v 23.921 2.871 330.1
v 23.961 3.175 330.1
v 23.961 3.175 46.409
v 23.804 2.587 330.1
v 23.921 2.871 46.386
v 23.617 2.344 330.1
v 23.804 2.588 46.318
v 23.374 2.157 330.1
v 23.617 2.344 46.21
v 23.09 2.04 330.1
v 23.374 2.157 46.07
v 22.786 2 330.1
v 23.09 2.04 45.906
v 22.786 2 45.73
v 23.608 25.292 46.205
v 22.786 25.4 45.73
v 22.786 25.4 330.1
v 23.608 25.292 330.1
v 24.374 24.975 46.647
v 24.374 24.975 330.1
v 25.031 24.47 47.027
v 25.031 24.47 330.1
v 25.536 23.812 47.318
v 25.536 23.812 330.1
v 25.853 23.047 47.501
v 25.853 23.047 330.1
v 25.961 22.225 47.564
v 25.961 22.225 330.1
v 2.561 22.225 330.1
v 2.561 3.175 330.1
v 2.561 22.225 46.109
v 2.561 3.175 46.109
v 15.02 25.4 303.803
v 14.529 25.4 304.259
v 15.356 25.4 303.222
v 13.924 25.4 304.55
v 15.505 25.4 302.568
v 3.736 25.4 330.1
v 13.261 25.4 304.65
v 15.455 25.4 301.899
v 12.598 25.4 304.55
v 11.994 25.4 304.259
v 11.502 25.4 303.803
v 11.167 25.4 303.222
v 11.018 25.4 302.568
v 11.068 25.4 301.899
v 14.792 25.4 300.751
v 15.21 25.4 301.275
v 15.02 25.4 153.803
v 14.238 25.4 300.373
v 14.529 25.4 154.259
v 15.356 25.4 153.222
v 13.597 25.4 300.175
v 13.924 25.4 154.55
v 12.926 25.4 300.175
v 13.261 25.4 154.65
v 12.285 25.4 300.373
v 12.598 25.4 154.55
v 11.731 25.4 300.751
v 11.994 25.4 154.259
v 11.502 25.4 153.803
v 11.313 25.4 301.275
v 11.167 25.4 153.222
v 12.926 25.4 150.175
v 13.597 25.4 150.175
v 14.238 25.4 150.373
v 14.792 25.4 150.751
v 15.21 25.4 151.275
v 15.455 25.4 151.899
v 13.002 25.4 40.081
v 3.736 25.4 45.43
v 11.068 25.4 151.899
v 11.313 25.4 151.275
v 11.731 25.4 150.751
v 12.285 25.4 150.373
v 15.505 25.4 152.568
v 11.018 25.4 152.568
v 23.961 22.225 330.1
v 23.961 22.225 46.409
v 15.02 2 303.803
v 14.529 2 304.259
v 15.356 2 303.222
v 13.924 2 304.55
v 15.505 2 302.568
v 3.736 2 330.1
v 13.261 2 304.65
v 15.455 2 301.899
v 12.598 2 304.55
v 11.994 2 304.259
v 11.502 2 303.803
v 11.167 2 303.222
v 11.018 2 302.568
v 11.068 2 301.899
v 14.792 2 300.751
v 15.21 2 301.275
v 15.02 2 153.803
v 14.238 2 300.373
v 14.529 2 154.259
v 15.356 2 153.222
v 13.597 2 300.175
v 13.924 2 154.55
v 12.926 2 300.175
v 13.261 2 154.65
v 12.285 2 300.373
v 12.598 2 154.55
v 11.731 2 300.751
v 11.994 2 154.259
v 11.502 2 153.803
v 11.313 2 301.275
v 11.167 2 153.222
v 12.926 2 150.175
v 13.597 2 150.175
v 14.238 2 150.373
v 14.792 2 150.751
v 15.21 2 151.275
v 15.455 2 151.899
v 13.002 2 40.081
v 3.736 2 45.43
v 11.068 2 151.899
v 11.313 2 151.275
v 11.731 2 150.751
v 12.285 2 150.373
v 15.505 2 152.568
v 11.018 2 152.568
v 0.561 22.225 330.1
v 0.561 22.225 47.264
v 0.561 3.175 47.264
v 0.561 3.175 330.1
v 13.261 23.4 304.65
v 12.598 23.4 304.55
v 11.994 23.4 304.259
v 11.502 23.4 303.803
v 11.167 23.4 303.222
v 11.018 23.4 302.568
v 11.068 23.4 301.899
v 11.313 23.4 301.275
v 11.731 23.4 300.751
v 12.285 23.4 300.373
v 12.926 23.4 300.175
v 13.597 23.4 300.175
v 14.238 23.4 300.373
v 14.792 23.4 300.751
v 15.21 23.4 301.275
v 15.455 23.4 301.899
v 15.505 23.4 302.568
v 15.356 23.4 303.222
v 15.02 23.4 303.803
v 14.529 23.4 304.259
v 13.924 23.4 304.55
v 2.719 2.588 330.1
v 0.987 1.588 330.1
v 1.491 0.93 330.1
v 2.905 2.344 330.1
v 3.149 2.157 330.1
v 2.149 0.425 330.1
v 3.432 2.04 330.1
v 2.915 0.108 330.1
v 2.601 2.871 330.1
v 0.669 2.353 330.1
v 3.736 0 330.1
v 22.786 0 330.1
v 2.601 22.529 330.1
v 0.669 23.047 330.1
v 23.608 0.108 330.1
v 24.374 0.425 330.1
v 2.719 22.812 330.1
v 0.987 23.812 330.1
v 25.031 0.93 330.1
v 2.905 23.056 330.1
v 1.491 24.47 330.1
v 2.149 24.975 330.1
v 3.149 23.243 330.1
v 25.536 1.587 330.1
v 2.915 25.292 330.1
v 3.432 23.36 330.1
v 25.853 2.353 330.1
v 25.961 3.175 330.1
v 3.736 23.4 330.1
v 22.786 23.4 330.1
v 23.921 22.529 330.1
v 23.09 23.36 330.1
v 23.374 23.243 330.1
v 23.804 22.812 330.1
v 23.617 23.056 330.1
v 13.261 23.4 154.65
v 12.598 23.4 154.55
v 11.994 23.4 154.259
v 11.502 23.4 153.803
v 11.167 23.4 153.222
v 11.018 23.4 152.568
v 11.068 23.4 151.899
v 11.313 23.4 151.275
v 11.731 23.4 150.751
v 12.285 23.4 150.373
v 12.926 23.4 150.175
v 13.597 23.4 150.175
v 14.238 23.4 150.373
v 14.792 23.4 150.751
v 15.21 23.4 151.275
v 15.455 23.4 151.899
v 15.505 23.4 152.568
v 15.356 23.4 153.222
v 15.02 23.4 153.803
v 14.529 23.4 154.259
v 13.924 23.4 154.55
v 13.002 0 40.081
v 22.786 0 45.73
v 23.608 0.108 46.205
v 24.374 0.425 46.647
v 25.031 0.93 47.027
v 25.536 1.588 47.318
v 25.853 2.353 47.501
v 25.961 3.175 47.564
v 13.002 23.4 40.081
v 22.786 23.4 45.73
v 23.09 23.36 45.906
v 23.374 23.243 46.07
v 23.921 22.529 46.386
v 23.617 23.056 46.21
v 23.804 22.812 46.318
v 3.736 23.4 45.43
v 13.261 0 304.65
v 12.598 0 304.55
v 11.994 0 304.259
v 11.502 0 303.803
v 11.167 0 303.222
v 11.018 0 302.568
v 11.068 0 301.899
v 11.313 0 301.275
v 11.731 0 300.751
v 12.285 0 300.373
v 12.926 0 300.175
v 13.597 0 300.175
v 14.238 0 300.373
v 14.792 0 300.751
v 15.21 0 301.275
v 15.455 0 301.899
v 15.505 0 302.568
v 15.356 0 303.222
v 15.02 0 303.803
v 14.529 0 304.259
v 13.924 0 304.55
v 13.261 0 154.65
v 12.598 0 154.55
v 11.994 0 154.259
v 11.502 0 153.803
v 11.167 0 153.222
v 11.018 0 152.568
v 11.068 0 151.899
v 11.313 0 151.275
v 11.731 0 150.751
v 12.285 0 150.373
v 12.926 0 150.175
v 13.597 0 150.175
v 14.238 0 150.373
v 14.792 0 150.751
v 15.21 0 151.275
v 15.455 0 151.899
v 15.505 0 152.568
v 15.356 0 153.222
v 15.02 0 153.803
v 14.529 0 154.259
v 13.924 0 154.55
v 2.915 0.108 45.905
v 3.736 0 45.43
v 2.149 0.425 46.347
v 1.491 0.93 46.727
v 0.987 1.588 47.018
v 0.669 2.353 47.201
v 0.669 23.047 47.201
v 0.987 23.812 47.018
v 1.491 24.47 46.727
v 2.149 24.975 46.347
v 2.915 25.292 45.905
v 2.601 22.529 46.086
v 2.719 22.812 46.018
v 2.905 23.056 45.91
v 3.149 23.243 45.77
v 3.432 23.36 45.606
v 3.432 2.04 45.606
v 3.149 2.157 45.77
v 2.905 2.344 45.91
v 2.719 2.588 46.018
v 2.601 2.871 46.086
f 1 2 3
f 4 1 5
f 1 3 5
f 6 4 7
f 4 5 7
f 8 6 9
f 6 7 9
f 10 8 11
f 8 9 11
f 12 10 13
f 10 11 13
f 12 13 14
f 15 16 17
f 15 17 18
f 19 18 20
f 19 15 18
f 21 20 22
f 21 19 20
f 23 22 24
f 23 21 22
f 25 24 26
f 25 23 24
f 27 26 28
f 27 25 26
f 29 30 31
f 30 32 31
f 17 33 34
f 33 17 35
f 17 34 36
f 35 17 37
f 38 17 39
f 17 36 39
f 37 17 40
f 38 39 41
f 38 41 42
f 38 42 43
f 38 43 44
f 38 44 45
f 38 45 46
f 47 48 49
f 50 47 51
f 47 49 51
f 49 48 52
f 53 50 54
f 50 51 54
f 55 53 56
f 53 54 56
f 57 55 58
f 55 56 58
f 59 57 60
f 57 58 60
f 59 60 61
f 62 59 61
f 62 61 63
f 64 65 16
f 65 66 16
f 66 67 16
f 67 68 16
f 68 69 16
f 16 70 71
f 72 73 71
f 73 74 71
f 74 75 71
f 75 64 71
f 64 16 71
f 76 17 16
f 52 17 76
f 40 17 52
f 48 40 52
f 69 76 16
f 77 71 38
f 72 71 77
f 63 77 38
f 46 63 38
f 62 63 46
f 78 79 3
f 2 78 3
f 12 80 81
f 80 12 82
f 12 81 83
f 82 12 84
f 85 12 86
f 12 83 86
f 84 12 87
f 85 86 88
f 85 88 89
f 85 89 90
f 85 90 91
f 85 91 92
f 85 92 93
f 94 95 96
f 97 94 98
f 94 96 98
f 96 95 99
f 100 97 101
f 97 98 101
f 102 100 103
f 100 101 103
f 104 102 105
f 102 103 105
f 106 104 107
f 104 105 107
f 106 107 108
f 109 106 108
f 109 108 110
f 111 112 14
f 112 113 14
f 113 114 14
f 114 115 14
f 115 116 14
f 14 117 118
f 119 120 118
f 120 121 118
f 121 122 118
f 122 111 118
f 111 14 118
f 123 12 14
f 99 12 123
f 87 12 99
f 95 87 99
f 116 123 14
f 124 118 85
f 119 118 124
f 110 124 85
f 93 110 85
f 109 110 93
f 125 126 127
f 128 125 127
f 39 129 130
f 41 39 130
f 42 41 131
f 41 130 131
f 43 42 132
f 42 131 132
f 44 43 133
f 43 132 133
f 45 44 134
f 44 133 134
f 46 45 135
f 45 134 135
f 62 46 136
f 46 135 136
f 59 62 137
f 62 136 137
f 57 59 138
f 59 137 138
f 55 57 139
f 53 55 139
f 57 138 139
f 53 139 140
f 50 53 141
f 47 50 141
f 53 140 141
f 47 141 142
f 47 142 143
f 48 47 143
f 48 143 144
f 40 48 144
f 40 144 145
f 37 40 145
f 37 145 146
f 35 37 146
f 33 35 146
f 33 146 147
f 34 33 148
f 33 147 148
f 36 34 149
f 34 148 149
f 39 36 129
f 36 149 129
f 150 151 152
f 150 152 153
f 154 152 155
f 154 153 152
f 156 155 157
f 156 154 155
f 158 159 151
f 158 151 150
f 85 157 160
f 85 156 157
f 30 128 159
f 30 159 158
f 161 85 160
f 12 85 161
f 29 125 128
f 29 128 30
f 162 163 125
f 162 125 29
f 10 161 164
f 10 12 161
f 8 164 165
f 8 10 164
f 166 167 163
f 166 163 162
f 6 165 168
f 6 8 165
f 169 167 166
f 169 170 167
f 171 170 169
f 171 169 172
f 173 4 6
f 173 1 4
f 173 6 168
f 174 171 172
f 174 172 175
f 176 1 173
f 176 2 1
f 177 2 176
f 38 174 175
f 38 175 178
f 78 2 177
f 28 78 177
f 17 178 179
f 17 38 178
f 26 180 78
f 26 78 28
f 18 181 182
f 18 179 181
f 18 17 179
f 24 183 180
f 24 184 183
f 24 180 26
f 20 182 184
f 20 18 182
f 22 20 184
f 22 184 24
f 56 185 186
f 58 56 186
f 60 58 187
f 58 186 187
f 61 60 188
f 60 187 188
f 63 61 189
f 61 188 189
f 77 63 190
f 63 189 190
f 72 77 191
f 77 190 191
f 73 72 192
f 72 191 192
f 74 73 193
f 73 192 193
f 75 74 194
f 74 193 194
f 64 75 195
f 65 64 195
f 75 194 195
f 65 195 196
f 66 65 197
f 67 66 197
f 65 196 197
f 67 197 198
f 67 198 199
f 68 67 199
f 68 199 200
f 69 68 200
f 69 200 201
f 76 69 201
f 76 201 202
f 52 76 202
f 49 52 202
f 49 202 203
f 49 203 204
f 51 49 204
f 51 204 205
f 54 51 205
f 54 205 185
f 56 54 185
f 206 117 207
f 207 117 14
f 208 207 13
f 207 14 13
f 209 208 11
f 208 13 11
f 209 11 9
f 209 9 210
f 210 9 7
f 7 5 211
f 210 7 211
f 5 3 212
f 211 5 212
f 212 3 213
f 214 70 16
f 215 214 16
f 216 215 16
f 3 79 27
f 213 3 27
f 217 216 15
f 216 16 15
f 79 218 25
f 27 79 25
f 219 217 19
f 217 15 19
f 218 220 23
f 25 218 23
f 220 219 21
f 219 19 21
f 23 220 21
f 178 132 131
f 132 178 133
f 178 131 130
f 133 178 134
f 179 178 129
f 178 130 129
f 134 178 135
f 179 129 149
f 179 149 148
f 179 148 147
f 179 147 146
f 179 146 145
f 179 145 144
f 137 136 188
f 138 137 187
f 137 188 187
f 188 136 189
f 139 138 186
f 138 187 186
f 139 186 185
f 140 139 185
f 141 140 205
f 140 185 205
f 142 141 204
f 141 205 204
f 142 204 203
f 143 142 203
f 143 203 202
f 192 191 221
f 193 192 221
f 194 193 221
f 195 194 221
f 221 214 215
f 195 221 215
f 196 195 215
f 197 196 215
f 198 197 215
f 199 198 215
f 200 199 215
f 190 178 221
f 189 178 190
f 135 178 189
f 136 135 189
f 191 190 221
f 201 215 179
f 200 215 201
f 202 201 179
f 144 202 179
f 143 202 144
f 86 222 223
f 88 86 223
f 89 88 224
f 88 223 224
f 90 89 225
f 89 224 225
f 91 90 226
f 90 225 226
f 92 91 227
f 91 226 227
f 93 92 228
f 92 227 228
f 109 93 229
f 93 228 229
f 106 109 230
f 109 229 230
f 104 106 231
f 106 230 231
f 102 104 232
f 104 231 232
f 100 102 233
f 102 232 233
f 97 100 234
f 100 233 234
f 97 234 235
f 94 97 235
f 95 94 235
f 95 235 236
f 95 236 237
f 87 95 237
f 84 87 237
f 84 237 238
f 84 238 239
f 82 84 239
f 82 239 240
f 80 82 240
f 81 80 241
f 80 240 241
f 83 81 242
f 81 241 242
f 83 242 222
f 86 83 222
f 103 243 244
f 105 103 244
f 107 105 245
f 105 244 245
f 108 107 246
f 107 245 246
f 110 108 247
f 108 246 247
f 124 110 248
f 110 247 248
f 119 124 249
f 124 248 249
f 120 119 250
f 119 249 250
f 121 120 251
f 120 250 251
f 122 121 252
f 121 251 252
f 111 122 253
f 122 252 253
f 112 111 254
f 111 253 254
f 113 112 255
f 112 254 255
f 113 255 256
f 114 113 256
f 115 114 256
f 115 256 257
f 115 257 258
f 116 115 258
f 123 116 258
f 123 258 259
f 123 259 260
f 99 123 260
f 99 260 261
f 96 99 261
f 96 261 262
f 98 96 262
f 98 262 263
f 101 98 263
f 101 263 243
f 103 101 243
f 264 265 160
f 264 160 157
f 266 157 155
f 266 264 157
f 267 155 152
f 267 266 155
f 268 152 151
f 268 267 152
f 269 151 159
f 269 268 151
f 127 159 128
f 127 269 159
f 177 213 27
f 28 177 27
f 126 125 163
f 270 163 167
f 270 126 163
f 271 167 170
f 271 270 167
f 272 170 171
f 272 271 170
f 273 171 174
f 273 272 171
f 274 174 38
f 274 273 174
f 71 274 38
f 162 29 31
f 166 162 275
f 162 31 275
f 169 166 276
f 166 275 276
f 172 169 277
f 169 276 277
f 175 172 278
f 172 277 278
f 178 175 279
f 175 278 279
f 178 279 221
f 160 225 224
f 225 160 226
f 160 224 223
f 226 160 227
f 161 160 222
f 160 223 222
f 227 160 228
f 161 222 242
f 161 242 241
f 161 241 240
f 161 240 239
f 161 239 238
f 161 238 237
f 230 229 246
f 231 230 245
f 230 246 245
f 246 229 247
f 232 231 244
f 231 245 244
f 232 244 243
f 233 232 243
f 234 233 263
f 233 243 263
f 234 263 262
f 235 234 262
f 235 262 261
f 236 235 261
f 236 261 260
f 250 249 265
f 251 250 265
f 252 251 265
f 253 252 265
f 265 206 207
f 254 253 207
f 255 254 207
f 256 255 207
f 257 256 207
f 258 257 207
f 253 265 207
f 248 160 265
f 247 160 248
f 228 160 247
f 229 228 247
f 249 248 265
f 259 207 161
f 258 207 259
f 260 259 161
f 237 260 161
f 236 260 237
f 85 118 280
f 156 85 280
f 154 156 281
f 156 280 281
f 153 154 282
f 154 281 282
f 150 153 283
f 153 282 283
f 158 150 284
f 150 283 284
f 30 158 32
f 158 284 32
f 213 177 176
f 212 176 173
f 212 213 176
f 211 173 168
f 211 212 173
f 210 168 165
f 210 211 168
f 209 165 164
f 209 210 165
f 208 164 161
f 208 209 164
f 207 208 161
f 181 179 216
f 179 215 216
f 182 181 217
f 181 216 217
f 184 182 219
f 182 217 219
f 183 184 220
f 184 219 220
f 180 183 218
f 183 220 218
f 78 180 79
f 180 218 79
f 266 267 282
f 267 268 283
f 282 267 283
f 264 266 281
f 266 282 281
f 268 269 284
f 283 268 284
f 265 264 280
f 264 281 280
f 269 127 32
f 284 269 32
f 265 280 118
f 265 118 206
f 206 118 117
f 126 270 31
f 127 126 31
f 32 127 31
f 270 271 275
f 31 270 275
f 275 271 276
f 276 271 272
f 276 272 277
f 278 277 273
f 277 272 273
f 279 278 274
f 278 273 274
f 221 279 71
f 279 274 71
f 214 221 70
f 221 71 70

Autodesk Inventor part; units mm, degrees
ref_plane "YZ Plane" through (0, 0, 0) normal (1, 0, 0) x (0, 1, 0)
ref_plane "XZ Plane" through (0, 0, 0) normal (0, 1, 0) x (-1, 0, 0)
ref_plane "XY Plane" through (0, 0, 0) normal (0, 0, 1) x (1, 0, 0)
sketch "Sketch1" plane through (0, 0, 0) normal (0, 0, 1) x (1, 0, 0)
  line L0 (3.7363, 0) -> (22.7863, 0)
  line L1 (25.9613, 3.175) -> (25.9613, 22.225)
  line L2 (22.7863, 25.4) -> (3.7363, 25.4)
  line L3 (0.5613, 22.225) -> (0.5613, 3.175)
  arc A0 (3.7363, 25.4) -> (0.5613, 22.225) centre (3.7363, 22.225) ccw
  arc A1 (0.5613, 3.175) -> (3.7363, 0) centre (3.7363, 3.175) ccw
  arc A2 (22.7863, 0) -> (25.9613, 3.175) centre (22.7863, 3.175) ccw
  arc A3 (25.9613, 22.225) -> (22.7863, 25.4) centre (22.7863, 22.225) ccw
  line L4 (3.7363, 23.4) -> (22.7863, 23.4)
  arc A4 (23.9613, 22.225) -> (22.7863, 23.4) centre (22.7863, 22.225) ccw
  line L5 (23.9613, 22.225) -> (23.9613, 3.175)
  arc A5 (22.7863, 2) -> (23.9613, 3.175) centre (22.7863, 3.175) ccw
  line L6 (22.7863, 2) -> (3.7363, 2)
  arc A6 (2.5613, 3.175) -> (3.7363, 2) centre (3.7363, 3.175) ccw
  line L7 (2.5613, 3.175) -> (2.5613, 22.225)
  arc A7 (3.7363, 23.4) -> (2.5613, 22.225) centre (3.7363, 22.225) ccw
  point P0 (0, 0)
  point P1 (0.5613, 0)
  point P2 (25.9613, 0)
  point P3 (0.5613, 25.4)
  dimension "d0" = 25.4
  dimension "d2" = 25.4
  dimension "d3" = 3.175
  dimension "d4" = 2
extrude "tube" add sketch "Sketch1" along normal blind 330.1
sketch "Sketch7" plane through (3.7363, 25.4, 0) normal (0, 1, 0) x (1, 0, 0)
  line L0 (19.05, 0) -> (0, 0) projected
  circle A0 centre (9.525, -25.4) radius 3.5758
  point P0 (-3.7363, 0)
  dimension "d45" = 25.4
hole "centerHole_cutOff" at (13.2613, 25.4, 25.4) direction (0, -1, 0) diameter 6.35 end through all
sketch "Sketch8" plane through (3.7363, 25.4, 0) normal (0, 1, 0) x (1, 0, 0)
  circle A0 centre (9.525, -25.4) radius 3.175 projected
  line L0 (0, 0) -> (0, -330.1) projected
  circle A1 centre (9.525, -152.4) radius 1.4483
  circle A2 centre (9.525, -302.4) radius 1.4483
  point P0 (-3.7363, 0)
  dimension "d55" = 150
  dimension "d60" = 127
hole "armHoles" at (13.2613, 25.4, 152.4) at (13.2613, 25.4, 302.4) direction (0, -1, 0) diameter 4.5 end through all clearance for "Flat Head Machine Screw" size "M4" standard "Ansi Metric M Profile"
sketch "Sketch9" plane through (3.7363, 25.4, 0) normal (0, 1, 0) x (1, 0, 0)
  circle A0 centre (9.525, -25.4) radius 3.175 construction
  line L0 (9.525, -25.4) -> (9.525, -40.0812) construction
  line L1 (-12.1249, -52.4308) -> (9.525, -39.9312)
  line L2 (-8.8213, -52.7845) -> (41.9787, -52.7845) construction
  line L3 (9.525, -40.0812) -> (40.882, -40.0812) construction
  line L4 (9.2652, -40.0812) -> (31.8692, -53.1316)
  line L5 (-12.1249, -52.4308) -> (-12.1249, 11.2848)
  line L6 (31.8692, -53.1316) -> (31.8692, 11.2848)
  line L7 (-12.1249, 11.2848) -> (31.8692, 11.2848)
  point P0 (-3.7363, 0)
  dimension "d68" = 14.6812
  dimension "d70" = 30
extrude "Extrusion4" cut sketch "Sketch9" against normal blind 50.8
properties part number "2f2ax2" material "Steel"
